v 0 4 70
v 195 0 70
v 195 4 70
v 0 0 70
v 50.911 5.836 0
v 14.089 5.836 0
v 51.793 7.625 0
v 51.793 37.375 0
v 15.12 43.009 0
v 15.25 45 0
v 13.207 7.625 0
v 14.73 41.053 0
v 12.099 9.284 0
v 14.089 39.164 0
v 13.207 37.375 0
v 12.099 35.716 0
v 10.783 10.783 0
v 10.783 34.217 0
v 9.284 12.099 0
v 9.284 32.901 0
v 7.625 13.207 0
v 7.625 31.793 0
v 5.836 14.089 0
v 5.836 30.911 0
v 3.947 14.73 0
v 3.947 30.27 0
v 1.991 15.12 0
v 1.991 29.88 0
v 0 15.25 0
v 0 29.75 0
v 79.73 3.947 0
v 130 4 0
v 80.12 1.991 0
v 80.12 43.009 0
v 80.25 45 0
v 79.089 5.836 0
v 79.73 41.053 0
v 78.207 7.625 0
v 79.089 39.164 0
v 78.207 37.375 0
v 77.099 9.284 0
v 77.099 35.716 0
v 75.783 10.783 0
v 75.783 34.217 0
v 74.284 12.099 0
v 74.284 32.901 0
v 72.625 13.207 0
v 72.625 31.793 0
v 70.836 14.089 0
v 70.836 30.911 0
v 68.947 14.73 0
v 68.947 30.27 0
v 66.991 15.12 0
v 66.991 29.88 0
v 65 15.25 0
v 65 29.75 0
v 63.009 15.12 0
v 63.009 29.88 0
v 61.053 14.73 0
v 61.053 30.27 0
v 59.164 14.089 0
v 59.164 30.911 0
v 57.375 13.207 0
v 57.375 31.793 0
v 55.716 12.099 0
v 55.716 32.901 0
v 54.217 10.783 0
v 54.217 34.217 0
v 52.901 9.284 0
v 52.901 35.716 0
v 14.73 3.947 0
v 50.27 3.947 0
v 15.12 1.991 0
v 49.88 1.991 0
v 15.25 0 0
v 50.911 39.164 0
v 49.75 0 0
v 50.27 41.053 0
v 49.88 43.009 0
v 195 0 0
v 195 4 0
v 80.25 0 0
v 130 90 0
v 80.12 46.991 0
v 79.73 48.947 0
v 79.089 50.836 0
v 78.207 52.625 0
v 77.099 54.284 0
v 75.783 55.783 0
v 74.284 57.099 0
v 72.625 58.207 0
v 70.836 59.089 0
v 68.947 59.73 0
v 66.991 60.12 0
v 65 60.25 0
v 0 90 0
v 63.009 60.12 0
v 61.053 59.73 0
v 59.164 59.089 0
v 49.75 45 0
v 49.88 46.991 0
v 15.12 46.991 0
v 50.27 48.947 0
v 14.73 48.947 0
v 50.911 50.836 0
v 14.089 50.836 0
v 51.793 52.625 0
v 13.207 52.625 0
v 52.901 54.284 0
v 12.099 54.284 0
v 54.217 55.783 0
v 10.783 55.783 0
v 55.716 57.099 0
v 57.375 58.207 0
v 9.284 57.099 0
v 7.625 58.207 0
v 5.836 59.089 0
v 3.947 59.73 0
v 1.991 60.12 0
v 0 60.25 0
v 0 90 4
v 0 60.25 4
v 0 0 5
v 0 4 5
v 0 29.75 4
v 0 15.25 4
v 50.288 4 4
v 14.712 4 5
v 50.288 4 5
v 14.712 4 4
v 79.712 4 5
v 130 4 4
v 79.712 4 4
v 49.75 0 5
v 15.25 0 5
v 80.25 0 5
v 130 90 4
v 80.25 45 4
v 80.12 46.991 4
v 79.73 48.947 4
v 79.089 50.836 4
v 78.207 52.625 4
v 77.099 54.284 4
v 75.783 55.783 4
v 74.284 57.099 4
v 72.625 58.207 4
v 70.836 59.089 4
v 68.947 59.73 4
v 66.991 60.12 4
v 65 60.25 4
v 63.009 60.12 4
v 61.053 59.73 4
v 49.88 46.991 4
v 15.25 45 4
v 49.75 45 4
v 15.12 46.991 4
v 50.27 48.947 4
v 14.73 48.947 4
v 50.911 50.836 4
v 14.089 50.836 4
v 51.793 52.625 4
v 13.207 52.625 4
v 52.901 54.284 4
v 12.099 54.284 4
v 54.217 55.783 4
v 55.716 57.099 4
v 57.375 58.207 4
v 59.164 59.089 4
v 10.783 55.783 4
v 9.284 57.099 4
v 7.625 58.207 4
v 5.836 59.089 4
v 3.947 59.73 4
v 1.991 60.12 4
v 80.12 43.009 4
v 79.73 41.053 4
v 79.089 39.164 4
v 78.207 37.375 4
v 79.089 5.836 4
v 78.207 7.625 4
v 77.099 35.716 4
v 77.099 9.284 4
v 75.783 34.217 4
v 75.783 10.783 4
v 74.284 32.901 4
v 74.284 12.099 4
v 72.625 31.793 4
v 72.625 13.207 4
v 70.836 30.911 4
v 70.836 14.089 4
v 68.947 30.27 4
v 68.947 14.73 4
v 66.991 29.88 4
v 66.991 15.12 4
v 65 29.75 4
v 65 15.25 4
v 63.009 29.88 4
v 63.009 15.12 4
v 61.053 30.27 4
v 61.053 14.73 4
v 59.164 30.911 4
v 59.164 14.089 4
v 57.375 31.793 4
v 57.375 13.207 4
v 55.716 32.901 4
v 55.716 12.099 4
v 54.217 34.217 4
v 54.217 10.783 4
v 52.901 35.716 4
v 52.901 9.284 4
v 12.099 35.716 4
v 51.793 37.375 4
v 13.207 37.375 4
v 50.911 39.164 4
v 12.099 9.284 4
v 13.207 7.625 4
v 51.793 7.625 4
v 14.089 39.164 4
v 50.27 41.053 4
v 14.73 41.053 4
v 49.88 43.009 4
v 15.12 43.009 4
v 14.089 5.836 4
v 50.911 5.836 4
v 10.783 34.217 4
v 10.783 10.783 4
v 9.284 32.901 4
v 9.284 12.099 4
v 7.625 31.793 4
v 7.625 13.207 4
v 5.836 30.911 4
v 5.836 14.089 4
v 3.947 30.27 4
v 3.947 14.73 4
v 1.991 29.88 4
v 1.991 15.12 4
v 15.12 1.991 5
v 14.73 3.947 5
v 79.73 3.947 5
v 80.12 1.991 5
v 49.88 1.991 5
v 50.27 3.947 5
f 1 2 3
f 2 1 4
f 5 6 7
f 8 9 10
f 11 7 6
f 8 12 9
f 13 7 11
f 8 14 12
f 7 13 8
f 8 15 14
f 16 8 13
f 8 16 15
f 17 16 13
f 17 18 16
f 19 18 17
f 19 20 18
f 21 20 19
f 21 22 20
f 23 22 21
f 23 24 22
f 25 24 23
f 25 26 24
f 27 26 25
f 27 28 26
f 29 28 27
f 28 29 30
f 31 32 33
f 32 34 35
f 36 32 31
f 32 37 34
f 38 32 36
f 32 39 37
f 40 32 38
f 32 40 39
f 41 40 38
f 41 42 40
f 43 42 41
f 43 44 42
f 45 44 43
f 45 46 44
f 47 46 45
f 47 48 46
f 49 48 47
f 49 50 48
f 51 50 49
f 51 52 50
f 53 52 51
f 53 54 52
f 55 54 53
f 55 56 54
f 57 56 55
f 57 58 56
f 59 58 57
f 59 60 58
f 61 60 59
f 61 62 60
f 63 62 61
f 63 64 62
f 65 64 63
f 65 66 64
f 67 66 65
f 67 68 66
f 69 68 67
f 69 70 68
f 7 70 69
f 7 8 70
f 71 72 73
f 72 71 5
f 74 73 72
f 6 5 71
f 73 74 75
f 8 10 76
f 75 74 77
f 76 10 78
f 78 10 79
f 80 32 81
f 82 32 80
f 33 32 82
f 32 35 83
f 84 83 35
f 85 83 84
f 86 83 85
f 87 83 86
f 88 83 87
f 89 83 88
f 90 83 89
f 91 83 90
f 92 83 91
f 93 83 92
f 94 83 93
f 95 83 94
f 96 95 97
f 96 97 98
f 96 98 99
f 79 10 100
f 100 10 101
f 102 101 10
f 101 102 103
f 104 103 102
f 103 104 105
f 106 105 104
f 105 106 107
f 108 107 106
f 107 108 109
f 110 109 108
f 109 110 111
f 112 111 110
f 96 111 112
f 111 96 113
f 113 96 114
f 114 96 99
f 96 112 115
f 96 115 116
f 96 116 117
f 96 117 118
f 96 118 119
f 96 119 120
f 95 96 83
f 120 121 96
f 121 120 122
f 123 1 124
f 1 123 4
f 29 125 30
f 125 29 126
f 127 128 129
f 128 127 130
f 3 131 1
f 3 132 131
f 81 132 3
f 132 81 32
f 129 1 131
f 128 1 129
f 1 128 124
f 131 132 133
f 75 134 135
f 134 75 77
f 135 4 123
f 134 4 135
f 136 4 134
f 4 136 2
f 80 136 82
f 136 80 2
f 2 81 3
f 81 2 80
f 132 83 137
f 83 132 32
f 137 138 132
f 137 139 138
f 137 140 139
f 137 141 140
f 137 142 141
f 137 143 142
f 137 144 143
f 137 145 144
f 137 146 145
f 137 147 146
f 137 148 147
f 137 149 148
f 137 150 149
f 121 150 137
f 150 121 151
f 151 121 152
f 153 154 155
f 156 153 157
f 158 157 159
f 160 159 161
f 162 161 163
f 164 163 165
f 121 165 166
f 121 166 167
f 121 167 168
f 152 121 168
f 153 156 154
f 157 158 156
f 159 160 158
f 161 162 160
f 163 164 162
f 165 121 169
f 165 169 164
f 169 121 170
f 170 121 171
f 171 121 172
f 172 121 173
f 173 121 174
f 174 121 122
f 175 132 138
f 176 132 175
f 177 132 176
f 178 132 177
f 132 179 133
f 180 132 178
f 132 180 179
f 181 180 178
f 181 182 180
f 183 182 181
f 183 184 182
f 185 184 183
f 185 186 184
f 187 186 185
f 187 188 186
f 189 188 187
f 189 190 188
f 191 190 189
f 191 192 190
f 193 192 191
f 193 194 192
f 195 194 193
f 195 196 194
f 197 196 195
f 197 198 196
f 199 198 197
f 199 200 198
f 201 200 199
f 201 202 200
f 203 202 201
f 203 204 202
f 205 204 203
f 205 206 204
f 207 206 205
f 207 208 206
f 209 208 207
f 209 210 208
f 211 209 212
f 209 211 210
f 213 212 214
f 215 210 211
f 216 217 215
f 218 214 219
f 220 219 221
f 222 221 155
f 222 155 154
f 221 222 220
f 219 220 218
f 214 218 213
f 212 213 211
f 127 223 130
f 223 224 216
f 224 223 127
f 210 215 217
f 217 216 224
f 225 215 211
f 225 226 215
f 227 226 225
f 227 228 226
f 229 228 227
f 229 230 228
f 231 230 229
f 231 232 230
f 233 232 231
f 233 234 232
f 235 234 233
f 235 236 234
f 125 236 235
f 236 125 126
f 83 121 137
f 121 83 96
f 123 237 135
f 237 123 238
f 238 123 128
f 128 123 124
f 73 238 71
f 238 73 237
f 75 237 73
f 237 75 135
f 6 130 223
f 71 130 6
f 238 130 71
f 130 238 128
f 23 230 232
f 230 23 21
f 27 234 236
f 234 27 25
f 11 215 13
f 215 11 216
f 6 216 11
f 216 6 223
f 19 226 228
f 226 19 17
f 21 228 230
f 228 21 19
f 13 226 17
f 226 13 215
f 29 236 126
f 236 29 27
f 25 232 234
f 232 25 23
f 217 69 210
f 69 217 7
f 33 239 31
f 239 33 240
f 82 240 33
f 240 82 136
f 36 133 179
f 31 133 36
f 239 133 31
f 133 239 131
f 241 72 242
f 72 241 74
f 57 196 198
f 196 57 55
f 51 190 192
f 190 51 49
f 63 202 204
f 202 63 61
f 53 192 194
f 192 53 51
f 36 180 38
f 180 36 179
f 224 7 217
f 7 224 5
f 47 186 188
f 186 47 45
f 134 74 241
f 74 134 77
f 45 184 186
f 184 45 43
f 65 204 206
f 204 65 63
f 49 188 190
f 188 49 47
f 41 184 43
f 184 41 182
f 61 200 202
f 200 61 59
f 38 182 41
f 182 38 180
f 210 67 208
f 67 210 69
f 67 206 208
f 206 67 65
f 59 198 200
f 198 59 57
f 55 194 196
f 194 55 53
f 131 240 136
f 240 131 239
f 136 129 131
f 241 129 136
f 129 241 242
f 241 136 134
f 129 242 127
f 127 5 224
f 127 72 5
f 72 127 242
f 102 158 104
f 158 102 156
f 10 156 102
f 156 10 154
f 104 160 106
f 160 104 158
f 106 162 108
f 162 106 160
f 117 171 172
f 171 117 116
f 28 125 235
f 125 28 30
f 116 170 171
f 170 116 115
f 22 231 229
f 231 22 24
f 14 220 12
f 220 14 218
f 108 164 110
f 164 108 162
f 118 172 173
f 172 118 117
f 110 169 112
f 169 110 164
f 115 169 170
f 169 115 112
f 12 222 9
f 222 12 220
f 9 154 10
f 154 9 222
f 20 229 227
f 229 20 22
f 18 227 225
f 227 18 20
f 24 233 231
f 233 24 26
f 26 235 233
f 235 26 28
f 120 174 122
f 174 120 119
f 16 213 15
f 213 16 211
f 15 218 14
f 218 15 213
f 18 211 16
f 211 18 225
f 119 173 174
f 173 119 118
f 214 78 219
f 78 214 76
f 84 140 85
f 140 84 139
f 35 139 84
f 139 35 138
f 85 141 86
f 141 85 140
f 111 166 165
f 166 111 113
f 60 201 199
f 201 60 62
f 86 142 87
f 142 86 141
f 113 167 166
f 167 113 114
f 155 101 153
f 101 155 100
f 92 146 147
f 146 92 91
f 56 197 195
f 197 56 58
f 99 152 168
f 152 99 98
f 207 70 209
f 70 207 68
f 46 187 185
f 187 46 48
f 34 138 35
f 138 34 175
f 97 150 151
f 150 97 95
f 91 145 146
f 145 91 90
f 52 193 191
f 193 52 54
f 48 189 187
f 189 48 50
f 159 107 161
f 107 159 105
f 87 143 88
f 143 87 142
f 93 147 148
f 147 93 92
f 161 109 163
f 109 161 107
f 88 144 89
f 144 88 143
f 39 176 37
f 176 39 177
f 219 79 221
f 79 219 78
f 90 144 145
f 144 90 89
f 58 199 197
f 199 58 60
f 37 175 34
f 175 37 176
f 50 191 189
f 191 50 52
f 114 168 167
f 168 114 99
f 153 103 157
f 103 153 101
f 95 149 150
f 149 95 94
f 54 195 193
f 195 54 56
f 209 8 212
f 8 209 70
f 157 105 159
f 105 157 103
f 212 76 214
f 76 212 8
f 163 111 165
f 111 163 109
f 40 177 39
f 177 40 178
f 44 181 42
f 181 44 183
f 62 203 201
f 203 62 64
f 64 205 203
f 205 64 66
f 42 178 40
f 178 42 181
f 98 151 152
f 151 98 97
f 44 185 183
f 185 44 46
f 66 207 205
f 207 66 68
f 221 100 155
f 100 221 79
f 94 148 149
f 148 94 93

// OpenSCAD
// Tube rack for six 50 mL conical (Falcon-type) tubes - printed upside down and flipped over.
// In print orientation: a flat plate lies on the bed (z = 0 to 4) with six through-holes for the
// tubes, and two solid walls run along the two long edges of the plate, rising to z = 70. The two
// short ends stay open. After flipping, the rack stands on the two walls and the tubes pass through
// the holes.
//

plate_x = 130;
plate_y = 90;
plate_t = 4;
hole_d  = 30.5;
row_p   = 40;
col_p   = 40;
wall_h  = 70;

$fn = 48;

wall_t = 4;

difference() {
    union() {
        translate([0, 0, 0]) cube([plate_x, plate_y, plate_t]);
        for (x = [0, plate_x / 2])
            translate([x, 0, 0]) cube([plate_x, wall_t, wall_h]);
    }
    for (r = [0, plate_y / 2])
        for (c = [0, plate_x / 2])
            translate([c, r, -1]) cylinder(h = plate_t + 2, d = hole_d);
}
